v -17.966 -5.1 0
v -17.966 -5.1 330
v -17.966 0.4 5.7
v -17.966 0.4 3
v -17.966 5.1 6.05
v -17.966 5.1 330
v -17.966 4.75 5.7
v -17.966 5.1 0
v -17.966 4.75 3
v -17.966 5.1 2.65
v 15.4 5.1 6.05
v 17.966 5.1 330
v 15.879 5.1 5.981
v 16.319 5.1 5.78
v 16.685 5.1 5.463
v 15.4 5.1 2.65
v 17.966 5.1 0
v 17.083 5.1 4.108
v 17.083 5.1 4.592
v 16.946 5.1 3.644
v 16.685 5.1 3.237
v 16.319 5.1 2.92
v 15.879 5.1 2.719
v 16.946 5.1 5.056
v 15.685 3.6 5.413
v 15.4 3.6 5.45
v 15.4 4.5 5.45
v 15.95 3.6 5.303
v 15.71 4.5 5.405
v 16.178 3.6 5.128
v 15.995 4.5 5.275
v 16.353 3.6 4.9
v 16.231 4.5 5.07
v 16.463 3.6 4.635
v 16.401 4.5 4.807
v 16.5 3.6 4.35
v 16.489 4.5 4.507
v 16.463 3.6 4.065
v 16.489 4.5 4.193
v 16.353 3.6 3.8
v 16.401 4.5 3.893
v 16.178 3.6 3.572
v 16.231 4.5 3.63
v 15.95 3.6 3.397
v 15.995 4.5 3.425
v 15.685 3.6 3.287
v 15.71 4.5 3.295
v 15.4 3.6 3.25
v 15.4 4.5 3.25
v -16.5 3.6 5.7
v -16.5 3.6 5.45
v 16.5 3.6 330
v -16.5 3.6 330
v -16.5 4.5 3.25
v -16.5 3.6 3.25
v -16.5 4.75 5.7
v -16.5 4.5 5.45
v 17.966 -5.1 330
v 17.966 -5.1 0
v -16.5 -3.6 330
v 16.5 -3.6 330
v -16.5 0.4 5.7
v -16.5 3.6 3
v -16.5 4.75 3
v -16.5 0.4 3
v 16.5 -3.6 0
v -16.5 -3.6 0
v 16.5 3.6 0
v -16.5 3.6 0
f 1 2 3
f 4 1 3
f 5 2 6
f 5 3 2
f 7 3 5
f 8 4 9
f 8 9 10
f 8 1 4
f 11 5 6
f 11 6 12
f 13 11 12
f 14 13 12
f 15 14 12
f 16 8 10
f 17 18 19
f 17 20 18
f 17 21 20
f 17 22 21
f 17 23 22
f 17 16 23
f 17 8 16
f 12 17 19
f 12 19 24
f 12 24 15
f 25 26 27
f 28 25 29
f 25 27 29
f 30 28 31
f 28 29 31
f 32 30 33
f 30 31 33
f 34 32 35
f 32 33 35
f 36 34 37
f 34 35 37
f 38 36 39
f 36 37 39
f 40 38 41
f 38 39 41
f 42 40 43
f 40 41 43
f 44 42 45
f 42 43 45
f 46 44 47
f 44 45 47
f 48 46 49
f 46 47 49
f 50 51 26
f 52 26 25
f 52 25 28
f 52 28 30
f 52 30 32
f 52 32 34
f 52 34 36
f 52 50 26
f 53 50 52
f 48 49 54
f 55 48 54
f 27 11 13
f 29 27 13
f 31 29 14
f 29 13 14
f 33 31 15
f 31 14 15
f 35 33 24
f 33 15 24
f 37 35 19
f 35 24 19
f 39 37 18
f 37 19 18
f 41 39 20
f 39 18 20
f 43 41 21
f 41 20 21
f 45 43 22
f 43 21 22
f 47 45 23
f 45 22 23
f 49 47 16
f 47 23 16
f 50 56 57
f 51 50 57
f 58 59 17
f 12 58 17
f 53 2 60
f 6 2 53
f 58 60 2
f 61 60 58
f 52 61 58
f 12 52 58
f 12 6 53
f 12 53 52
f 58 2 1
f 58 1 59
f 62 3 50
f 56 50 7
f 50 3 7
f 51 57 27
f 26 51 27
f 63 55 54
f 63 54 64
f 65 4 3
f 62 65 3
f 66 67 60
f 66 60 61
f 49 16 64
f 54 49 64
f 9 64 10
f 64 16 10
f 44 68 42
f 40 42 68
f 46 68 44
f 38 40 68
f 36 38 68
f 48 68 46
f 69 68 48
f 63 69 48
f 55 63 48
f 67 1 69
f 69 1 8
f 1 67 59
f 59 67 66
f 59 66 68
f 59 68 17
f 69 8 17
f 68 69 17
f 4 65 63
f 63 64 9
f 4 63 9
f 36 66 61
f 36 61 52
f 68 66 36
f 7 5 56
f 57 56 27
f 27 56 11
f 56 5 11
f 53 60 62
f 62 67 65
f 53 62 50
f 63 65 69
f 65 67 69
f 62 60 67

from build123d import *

# Parameters (mm, degrees)
SCHIZZO1_W                   = 35.931818182
SCHIZZO1_H                   = 10.2
SCHIZZO1_W_2                 = 33
SCHIZZO1_H_2                 = 7.2
ESTRUSIONE_ESTRUSIONE1_DEPTH = 330
SCHIZZO3_W                   = 2.7
SCHIZZO3_H                   = 3.2
TAGLIO_ESTRUSIONE1_DEPTH     = 34.465909091
TAGLIO_ESTRUSIONE2_DEPTH     = 1.5
SMUSSO2_SIZE                 = 0.6


with BuildPart() as part:
    # Schizzo1 → Estrusione-Estrusione1 (new body)
    with BuildSketch(Plane.XY):
        Rectangle(SCHIZZO1_W, SCHIZZO1_H)
        Rectangle(SCHIZZO1_W_2, SCHIZZO1_H_2, mode=Mode.SUBTRACT)
    extrude(amount=ESTRUSIONE_ESTRUSIONE1_DEPTH)

    # Schizzo3 → Taglio-Estrusione1 (cut)
    with BuildSketch(Plane.ZY.offset(17.965909091)):
        with Locations((4.35, 2)):
            Rectangle(SCHIZZO3_W, SCHIZZO3_H)
    extrude(amount=-TAGLIO_ESTRUSIONE1_DEPTH, mode=Mode.SUBTRACT)

    # Schizzo4 → Taglio-Estrusione2 (cut)
    with BuildSketch(Plane(origin=(0, 5.1, 0), x_dir=(1, 0, 0), z_dir=(0, 1, 0))):
        with BuildLine():
            Line((-16.5, -5.45), (15.4, -5.45))
            ThreePointArc((15.4, -5.45), (16.5, -4.35), (15.4, -3.25))
            Line((15.4, -3.25), (-16.5, -3.25))
            Line((-16.5, -3.25), (-16.5, -3))
            Line((-16.5, -3), (-17.965909091, -3))
            Line((-17.965909091, -3), (-17.965909091, -5.7))
            Line((-17.965909091, -5.7), (-16.5, -5.7))
            Line((-16.5, -5.7), (-16.5, -5.45))
        make_face()
    extrude(amount=-TAGLIO_ESTRUSIONE2_DEPTH, mode=Mode.SUBTRACT)

    # Smusso2
    smusso2_edges = [part.edges().sort_by_distance(p)[0] for p in [
        (-0.55, 5.1, 3.25),
        (16.5, 5.1, 4.35),
        (-0.55, 5.1, 5.45),
    ]]
    chamfer(smusso2_edges, length=SMUSSO2_SIZE)


solid = part.part
